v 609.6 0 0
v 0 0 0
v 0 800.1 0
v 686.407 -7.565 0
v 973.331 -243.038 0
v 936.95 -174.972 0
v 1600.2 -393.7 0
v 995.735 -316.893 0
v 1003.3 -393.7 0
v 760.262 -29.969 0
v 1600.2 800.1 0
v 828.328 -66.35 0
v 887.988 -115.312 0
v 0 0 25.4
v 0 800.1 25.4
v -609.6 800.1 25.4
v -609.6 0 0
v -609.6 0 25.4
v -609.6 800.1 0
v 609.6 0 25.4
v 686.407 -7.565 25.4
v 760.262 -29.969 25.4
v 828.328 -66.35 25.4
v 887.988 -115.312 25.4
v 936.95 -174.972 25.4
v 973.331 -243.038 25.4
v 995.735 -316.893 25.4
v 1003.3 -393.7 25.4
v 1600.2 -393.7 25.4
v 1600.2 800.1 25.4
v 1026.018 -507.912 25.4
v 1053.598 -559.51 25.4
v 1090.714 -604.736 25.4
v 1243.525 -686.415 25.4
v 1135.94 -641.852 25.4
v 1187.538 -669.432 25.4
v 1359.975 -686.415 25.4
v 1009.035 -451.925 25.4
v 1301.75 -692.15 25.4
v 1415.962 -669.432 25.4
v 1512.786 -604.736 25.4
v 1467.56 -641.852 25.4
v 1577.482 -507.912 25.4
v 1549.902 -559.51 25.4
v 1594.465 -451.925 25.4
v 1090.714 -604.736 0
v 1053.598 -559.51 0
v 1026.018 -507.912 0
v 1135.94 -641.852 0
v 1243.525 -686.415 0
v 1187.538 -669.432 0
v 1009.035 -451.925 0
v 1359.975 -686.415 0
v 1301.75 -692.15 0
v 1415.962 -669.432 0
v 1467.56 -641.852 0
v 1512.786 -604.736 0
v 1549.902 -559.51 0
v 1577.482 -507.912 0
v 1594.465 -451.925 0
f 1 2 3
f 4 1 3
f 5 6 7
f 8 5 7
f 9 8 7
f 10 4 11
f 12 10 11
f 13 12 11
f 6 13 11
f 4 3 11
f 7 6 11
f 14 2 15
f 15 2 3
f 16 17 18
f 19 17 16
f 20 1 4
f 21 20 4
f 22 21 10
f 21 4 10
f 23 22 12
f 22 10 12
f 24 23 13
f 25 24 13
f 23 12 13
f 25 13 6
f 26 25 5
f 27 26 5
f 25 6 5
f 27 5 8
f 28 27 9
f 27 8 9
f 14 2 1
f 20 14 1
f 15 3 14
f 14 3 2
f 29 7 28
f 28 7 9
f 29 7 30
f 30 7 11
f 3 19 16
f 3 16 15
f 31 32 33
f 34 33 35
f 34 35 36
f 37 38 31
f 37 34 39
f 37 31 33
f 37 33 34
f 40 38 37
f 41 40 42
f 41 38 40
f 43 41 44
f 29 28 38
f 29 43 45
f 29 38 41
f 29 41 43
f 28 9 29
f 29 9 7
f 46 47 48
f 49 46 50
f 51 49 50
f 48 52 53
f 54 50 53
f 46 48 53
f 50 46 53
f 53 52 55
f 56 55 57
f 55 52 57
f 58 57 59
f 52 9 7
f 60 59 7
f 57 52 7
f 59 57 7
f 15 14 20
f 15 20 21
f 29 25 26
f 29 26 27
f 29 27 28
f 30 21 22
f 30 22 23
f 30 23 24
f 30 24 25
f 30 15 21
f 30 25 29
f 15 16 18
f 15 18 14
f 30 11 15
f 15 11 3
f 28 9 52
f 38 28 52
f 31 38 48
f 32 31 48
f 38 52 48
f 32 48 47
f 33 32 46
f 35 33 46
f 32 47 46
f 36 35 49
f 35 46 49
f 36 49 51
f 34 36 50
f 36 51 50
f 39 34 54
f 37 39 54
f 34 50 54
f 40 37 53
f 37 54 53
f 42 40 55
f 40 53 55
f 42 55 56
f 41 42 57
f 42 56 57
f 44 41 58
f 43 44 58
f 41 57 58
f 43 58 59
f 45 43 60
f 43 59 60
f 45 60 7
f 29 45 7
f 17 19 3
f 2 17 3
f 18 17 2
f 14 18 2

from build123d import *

# Parameters (mm, degrees)
F0_W     = 609.6
F0_H     = 800.1
F1_DEPTH = 25.4
F3_DEPTH = 25.4
F5_DEPTH = 25.4


with BuildPart() as f1:
    # F0 (on Top) → F1 (new body)
    with BuildSketch(Plane.XY):
        with Locations((-304.8, 400.05)):
            Rectangle(F0_W, F0_H)
    extrude(amount=F1_DEPTH)


with BuildPart() as f3:
    # F2 (on Top) → F3 (new body)
    with BuildSketch(Plane.XY):
        with BuildLine():
            Line((1600.2, 800.1), (0, 800.1))
            Line((0, 800.1), (0, 0))
            Line((0, 0), (609.6, 0))
            ThreePointArc((609.6, 0), (887.98794, -115.31206), (1003.3, -393.7))
            Line((1003.3, -393.7), (1600.2, -393.7))
            Line((1600.2, -393.7), (1600.2, 800.1))
        make_face()
    extrude(amount=F3_DEPTH)


with BuildPart() as f5:
    # F4 (on Top) → F5 (new body)
    with BuildSketch(Plane.XY):
        with BuildLine():
            ThreePointArc((1003.3, -393.7), (1301.75, -692.15), (1600.2, -393.7))
            Line((1600.2, -393.7), (1003.3, -393.7))
        make_face()
    extrude(amount=F5_DEPTH)


solid = Compound([f1.part, f3.part, f5.part])
